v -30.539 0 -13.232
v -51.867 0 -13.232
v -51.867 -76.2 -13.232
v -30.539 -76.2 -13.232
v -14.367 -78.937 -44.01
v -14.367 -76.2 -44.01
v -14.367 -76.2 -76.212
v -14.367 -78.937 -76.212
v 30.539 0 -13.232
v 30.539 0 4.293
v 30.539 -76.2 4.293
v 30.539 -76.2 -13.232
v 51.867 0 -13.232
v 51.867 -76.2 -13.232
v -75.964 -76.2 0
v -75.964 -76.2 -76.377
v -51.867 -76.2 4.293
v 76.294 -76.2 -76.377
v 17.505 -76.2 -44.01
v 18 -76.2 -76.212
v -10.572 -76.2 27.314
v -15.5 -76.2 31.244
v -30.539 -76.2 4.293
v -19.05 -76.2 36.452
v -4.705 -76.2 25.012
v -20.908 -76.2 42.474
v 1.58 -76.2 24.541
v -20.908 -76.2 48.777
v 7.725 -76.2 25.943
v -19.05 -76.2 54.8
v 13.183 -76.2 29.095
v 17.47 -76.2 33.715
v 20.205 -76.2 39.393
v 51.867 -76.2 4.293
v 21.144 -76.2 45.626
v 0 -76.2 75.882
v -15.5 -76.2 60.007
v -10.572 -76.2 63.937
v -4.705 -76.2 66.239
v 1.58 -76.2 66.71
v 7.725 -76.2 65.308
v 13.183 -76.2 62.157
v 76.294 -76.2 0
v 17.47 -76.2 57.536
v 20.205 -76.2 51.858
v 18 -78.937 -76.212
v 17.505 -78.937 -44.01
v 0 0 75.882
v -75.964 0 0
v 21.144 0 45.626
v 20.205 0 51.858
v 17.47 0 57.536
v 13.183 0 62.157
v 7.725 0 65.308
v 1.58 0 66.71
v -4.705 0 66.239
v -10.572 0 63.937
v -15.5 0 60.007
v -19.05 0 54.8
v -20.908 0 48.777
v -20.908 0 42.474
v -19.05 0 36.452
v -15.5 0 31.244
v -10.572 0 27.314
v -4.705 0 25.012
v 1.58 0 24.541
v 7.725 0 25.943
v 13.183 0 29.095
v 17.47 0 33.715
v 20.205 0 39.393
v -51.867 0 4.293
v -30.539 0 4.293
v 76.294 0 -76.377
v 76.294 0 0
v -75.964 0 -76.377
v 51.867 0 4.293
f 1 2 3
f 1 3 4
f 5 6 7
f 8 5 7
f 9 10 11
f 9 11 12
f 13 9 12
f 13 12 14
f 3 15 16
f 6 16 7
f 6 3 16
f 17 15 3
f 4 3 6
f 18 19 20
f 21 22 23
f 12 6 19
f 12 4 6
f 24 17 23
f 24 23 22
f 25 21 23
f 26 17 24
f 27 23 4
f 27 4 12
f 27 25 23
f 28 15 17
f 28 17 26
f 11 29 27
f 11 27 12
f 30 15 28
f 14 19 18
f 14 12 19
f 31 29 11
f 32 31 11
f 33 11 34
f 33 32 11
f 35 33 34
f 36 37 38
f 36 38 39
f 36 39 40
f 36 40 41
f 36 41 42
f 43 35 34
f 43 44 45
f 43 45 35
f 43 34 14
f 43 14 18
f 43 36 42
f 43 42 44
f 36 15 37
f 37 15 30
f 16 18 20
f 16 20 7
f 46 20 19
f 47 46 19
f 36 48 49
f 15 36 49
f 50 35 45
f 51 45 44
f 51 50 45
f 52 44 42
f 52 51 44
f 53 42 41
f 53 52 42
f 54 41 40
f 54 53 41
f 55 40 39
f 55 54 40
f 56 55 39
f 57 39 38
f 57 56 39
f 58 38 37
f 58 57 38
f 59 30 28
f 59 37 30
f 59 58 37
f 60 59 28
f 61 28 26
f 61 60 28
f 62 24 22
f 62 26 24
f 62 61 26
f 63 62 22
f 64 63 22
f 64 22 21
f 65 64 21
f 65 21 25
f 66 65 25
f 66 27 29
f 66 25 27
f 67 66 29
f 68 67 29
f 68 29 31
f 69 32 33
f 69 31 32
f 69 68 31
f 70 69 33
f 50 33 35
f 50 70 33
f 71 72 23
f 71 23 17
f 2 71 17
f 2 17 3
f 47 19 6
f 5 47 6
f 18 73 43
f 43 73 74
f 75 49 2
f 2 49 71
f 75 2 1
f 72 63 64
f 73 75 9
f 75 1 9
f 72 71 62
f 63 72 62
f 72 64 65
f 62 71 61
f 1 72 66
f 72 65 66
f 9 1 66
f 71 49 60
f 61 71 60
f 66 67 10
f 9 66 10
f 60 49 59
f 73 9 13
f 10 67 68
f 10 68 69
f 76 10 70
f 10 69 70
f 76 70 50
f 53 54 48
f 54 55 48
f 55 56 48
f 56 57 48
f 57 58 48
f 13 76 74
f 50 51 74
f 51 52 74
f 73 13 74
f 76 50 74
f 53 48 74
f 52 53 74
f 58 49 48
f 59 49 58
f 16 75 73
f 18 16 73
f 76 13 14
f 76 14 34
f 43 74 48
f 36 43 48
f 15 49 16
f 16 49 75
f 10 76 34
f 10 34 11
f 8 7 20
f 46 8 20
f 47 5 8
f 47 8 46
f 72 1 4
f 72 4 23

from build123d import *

# Parameters (mm, degrees)
F1_DEPTH = 76.2
F3_DEPTH = 78.93746
F4_W     = 10.663852
F4_H     = 8.762545
F5_DEPTH = 80.45524
F6_R     = 21.143911
F7_DEPTH = 84.04915


with BuildPart() as f1:
    # F0 (on Front) → F1 (new body)
    with BuildSketch(Plane.XZ):
        Polygon((76.294363, 0), (0, 75.881518), (-75.964086, 0), (-75.964086, -76.376937), (76.294363, -76.376937), align=None)
    extrude(amount=F1_DEPTH)

    # F2 (on Front) → F3 (join)
    with BuildSketch(Plane.XZ):
        Polygon((18.000185, -76.211795), (17.50477, -44.009626), (-14.367121, -44.009626), (-14.367121, -76.211795), align=None)
    extrude(amount=F3_DEPTH)

    # F4 (on Front) → F5 (cut)
    with BuildSketch(Plane.XZ):
        with Locations((-46.53484, -0.088469)):
            Rectangle(F4_W, F4_H)
        with Locations((-35.870988, -0.088469)):
            Rectangle(F4_W, F4_H)
        with Locations((-46.53484, -8.851014)):
            Rectangle(F4_W, F4_H)
        with Locations((-35.870988, -8.851014)):
            Rectangle(F4_W, F4_H)
        with Locations((46.53484, -0.088469)):
            Rectangle(F4_W, F4_H)
        with Locations((46.53484, -8.851014)):
            Rectangle(F4_W, F4_H)
        with Locations((35.870988, -0.088469)):
            Rectangle(F4_W, F4_H)
        with Locations((35.870988, -8.851014)):
            Rectangle(F4_W, F4_H)
    extrude(amount=F5_DEPTH, mode=Mode.SUBTRACT)

    # F6 (on Front) → F7 (cut)
    with BuildSketch(Plane.XZ):
        with Locations((0, 45.625564)):
            Circle(F6_R)
    extrude(amount=F7_DEPTH, mode=Mode.SUBTRACT)


solid = f1.part
